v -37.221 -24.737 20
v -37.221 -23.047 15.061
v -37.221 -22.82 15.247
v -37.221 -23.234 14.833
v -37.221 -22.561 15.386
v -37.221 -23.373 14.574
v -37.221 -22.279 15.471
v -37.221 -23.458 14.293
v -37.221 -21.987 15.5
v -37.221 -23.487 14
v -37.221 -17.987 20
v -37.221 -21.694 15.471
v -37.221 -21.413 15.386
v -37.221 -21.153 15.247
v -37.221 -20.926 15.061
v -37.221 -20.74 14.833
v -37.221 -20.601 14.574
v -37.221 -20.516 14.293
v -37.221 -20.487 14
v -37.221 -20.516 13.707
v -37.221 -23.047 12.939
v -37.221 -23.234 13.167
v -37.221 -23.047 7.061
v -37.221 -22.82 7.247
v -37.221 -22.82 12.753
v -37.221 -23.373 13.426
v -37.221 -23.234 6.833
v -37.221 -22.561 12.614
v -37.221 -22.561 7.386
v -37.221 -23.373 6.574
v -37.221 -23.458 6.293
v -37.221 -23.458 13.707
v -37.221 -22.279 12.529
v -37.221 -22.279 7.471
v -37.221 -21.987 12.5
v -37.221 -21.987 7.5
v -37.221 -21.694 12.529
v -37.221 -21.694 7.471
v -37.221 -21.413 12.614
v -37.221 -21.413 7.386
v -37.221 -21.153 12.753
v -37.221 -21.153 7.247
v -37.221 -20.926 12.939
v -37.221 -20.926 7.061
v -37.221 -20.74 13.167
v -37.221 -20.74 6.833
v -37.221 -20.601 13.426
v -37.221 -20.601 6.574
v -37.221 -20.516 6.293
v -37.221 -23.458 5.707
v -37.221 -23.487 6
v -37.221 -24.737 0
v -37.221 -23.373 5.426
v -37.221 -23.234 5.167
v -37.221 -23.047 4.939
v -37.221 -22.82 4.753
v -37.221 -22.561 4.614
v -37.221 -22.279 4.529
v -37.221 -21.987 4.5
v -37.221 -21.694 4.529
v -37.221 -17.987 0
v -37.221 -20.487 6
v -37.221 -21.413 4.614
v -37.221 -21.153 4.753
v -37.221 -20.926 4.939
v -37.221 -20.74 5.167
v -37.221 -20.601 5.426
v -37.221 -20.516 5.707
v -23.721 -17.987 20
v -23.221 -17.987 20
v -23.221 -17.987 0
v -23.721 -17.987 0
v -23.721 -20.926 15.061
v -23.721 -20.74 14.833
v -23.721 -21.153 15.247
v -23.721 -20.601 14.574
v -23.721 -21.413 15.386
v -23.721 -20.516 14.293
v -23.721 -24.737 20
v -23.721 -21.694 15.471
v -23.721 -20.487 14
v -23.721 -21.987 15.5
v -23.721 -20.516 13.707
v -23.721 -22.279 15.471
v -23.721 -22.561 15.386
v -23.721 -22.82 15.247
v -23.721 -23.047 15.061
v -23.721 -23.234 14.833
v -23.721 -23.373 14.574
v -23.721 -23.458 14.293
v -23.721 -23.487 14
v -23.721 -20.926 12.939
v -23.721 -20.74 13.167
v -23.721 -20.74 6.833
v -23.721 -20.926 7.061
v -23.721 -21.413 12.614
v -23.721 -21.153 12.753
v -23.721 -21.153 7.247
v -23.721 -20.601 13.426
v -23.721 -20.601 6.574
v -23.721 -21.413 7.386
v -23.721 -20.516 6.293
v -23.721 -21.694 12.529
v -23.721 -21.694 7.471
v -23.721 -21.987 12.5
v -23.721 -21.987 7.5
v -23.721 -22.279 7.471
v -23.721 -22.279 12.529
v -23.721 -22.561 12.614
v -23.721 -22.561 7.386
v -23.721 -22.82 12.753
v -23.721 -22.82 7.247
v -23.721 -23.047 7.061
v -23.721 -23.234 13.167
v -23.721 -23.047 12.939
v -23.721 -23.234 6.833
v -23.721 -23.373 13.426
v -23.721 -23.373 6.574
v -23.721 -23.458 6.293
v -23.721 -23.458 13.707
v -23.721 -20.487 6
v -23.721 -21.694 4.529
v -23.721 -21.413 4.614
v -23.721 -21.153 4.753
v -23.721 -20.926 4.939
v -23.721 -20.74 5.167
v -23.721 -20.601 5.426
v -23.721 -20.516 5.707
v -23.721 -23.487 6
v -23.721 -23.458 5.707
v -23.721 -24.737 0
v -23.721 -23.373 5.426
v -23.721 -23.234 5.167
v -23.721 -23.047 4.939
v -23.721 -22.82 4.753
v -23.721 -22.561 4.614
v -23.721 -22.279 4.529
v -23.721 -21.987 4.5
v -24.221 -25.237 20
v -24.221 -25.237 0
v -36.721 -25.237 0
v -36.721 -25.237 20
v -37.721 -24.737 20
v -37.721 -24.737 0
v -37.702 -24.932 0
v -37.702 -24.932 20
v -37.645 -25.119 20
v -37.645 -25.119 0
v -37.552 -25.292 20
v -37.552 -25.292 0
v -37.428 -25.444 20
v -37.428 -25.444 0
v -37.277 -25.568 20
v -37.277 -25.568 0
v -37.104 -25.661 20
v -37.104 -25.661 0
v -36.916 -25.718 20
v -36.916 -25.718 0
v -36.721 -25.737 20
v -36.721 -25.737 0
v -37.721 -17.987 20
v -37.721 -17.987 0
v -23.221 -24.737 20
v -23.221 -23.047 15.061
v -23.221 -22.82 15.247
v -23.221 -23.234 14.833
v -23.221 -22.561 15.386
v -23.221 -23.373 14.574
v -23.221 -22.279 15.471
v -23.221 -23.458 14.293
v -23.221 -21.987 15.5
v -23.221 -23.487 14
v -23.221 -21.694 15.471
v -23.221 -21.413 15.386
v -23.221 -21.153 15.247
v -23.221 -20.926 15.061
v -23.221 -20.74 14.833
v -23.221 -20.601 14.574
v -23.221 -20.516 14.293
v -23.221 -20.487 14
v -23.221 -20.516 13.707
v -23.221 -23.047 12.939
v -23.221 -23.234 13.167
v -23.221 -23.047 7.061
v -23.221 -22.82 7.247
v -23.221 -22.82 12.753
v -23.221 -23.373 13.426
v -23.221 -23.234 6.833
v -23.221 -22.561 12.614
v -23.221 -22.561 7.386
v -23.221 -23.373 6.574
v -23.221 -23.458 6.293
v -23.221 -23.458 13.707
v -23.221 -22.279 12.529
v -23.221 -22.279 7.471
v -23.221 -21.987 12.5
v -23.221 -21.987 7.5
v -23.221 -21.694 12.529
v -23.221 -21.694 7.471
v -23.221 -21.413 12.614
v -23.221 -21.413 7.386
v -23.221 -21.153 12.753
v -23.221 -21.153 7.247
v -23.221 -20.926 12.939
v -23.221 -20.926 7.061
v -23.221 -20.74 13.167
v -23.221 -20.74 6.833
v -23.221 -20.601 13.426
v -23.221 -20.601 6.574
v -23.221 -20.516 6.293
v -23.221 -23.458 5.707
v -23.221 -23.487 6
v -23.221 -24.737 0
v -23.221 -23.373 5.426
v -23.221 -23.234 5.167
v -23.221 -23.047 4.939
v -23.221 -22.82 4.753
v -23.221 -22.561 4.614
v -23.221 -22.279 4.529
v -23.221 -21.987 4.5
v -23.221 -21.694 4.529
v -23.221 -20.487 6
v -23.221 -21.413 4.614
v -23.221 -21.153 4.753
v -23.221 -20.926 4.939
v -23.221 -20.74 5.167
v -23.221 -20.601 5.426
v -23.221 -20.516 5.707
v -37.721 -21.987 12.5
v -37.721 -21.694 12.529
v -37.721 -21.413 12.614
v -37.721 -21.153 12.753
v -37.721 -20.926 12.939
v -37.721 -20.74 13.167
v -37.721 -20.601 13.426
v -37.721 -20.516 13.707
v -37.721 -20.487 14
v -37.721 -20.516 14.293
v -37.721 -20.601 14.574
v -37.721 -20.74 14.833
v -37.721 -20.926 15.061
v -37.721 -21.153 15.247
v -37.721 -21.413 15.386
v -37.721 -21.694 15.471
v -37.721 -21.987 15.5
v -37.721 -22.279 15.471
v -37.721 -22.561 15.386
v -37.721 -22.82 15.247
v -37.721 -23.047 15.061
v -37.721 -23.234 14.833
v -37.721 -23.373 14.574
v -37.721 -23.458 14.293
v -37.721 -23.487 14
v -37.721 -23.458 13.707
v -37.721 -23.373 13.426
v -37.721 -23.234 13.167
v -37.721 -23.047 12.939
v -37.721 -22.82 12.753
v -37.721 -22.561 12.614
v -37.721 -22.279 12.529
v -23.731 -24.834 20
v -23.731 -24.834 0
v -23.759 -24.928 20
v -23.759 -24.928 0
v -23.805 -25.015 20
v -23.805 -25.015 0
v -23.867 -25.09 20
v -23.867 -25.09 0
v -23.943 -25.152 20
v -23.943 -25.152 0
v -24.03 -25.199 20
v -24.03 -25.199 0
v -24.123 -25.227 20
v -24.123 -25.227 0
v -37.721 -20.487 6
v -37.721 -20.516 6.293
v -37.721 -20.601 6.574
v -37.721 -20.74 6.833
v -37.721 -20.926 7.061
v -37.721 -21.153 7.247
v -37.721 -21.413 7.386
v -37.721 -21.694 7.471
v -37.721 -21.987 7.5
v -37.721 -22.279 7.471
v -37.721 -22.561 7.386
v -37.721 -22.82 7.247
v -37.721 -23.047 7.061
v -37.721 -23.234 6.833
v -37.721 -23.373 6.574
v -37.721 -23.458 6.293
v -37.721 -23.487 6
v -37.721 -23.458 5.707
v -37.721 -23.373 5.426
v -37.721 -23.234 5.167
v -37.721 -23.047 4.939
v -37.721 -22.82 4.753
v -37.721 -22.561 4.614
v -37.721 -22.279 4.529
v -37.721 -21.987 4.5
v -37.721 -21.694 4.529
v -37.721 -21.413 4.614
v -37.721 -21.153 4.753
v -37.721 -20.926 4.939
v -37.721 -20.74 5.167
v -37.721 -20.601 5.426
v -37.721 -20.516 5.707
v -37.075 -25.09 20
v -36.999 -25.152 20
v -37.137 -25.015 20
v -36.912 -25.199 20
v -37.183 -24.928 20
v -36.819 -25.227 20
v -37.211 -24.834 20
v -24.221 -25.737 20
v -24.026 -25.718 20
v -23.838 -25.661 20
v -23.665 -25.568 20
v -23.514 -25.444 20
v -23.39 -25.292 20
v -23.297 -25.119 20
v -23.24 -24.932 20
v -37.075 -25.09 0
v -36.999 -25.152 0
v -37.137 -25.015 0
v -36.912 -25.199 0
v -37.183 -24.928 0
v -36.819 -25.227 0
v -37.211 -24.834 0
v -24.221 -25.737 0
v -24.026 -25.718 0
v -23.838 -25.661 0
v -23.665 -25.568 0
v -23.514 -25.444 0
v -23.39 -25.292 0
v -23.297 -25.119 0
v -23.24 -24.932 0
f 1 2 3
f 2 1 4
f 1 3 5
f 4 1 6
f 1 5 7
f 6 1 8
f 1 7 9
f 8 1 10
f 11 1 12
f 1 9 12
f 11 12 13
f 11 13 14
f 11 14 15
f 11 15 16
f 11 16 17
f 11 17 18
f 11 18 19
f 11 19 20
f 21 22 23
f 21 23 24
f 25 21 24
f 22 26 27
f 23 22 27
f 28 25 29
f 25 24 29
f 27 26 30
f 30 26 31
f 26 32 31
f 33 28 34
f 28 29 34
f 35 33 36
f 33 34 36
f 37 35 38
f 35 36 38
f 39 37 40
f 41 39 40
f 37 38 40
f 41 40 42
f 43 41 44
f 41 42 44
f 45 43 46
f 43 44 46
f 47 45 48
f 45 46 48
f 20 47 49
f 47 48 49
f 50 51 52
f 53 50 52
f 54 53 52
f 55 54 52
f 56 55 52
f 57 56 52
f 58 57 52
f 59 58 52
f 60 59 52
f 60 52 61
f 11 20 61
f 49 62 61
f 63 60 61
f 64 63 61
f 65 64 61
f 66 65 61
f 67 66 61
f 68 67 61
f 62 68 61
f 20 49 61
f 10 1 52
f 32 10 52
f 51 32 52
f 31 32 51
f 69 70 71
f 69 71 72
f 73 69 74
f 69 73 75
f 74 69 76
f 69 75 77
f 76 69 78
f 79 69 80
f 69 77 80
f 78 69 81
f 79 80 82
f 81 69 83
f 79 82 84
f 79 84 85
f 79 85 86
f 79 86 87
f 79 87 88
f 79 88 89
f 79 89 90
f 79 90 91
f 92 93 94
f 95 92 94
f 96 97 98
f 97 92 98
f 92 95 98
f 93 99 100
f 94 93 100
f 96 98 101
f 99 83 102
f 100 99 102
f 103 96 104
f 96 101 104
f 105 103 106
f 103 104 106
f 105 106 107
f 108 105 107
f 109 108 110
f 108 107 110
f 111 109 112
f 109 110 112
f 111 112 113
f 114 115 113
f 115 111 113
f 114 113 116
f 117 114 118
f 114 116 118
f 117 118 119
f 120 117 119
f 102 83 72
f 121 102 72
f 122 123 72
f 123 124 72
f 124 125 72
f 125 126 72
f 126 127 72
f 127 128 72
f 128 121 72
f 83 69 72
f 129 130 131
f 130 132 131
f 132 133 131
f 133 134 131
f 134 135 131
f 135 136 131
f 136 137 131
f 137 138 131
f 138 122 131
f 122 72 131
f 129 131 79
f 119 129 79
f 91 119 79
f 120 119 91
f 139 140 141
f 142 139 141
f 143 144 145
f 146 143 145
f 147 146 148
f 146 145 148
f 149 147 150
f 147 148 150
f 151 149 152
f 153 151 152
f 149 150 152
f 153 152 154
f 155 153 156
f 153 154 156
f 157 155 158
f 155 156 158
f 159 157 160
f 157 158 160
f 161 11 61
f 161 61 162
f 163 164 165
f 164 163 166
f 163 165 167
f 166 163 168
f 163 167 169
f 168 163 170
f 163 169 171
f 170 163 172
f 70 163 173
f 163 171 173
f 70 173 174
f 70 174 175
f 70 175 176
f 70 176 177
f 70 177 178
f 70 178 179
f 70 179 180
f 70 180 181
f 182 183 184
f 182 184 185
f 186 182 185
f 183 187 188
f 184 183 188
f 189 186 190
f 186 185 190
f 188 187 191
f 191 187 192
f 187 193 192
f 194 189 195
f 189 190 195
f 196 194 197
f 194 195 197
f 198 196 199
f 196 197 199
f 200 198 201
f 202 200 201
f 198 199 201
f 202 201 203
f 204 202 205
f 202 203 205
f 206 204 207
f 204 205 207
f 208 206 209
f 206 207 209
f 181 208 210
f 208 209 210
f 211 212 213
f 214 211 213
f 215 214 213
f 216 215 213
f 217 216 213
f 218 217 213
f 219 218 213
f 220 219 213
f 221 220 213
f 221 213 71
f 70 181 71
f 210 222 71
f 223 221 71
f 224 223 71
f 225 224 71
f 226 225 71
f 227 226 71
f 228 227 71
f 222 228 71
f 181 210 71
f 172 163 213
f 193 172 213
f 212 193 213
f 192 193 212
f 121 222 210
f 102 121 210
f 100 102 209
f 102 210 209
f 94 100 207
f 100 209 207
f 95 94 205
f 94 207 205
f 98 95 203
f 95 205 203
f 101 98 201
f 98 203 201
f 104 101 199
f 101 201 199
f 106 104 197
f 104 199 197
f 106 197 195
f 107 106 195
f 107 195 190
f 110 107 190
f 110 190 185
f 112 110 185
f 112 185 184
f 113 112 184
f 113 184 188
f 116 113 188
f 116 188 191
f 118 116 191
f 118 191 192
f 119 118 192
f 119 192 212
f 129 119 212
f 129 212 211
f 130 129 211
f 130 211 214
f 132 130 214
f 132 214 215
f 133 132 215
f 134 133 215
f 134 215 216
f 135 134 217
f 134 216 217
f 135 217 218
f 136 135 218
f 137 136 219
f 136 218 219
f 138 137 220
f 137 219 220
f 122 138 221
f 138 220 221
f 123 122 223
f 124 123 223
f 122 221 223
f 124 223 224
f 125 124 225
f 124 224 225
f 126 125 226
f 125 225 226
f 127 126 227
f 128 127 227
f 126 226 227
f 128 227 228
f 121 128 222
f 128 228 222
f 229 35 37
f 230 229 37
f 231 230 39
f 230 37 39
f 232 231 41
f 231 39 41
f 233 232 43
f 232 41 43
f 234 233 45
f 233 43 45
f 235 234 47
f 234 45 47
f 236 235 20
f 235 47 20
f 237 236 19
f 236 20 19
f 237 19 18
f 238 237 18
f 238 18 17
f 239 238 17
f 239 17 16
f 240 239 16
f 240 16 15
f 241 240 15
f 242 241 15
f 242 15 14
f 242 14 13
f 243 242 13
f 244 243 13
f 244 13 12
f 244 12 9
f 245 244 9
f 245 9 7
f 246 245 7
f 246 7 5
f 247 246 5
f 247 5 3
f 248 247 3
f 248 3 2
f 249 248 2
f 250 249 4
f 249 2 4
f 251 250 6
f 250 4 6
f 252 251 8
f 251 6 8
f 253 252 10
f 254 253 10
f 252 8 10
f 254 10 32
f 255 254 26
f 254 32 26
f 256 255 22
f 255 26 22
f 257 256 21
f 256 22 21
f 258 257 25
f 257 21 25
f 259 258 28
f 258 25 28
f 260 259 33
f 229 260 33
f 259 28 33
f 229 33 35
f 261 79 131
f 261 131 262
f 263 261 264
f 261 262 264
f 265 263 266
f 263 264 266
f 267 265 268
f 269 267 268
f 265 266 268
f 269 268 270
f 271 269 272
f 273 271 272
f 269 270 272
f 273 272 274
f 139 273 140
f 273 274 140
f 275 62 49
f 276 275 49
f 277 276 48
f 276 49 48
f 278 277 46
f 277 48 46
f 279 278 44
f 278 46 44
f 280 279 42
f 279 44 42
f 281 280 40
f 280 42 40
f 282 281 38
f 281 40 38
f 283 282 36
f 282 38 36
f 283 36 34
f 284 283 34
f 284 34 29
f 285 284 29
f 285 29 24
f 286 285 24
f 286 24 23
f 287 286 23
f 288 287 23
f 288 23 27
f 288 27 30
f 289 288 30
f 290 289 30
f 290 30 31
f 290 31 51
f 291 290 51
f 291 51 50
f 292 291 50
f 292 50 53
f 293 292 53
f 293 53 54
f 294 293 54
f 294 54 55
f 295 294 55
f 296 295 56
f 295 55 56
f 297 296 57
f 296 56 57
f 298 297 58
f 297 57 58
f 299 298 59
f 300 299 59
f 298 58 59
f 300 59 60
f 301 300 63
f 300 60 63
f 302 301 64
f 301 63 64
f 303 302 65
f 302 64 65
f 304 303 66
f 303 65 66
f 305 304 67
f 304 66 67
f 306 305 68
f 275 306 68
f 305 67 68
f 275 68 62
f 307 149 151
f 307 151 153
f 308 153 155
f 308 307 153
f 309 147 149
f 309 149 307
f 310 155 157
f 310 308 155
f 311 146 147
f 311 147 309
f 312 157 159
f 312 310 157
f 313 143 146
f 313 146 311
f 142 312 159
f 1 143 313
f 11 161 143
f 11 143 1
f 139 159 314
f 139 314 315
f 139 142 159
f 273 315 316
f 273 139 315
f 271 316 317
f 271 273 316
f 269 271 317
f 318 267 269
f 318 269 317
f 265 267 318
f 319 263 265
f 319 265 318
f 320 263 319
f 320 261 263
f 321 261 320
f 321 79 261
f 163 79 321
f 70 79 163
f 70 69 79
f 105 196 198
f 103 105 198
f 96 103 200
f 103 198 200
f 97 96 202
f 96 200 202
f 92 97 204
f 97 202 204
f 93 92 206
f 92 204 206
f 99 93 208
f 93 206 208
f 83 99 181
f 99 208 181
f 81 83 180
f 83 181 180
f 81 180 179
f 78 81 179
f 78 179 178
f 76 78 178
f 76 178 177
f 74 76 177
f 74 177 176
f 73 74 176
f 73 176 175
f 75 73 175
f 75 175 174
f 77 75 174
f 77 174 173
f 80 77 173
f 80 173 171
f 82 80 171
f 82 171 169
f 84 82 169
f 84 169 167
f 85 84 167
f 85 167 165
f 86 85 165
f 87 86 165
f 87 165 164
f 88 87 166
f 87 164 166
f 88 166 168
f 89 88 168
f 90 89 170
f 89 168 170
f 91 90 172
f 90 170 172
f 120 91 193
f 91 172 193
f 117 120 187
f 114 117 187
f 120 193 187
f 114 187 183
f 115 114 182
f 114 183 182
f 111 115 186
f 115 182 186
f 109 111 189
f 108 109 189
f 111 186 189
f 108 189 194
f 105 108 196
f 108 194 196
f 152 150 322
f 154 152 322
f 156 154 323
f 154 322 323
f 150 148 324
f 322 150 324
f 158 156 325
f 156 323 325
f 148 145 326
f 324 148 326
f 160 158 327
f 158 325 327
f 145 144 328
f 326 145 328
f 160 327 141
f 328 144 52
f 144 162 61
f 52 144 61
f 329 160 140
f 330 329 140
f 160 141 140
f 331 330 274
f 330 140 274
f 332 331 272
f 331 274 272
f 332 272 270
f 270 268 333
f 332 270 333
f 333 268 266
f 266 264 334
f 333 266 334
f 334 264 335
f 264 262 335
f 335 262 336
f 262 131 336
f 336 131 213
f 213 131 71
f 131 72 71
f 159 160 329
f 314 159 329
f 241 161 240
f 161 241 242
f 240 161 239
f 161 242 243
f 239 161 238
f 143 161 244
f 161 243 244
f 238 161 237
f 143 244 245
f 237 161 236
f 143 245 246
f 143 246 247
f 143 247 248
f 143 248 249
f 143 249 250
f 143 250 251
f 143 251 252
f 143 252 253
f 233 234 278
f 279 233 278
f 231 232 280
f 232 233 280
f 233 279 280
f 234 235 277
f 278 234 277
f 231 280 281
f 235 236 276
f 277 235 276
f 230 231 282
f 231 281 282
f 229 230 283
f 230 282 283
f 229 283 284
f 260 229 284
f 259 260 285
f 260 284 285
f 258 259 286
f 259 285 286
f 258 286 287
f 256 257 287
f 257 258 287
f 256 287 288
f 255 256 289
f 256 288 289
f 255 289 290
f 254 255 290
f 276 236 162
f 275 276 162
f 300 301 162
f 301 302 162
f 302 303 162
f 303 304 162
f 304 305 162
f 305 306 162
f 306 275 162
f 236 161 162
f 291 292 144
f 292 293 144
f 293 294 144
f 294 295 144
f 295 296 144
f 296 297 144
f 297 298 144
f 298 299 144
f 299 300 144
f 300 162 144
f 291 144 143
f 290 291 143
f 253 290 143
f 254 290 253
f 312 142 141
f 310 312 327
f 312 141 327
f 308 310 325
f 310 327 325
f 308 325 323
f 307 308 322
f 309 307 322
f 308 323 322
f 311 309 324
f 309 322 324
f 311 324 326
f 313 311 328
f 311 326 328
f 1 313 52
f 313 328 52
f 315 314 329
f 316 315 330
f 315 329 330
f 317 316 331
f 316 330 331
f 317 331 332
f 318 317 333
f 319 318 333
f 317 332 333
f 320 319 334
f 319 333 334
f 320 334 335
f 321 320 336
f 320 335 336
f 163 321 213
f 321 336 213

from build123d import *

# Parameters (mm, degrees)
BRIDA_BASE1_DEPTH     = 20
CROQUIS5_R            = 1.5
CORTAR_EXTRUIR1_DEPTH = 36.673932989


# Sheet-metal steps are written as plain solids
with BuildPart() as part:
    # Croquis1 → Brida base1 (new body)
    with BuildSketch(Plane.XY):
        with BuildLine():
            Line((-37.721015228, -17.986734349), (-37.721015228, -24.736734349))
            ThreePointArc((-37.721015228, -24.736734349), (-37.42812201, -25.44384113), (-36.721015228, -25.736734349))
            Line((-36.721015228, -25.736734349), (-24.221015228, -25.736734349))
            ThreePointArc((-24.221015228, -25.736734349), (-23.513908447, -25.44384113), (-23.221015228, -24.736734349))
            Line((-23.221015228, -24.736734349), (-23.221015228, -17.986734349))
            Line((-23.221015228, -17.986734349), (-23.721015228, -17.986734349))
            Line((-23.721015228, -17.986734349), (-23.721015228, -24.736734349))
            ThreePointArc((-23.721015228, -24.736734349), (-23.867461838, -25.090287739), (-24.221015228, -25.236734349))
            Line((-24.221015228, -25.236734349), (-36.721015228, -25.236734349))
            ThreePointArc((-36.721015228, -25.236734349), (-37.074568619, -25.090287739), (-37.221015228, -24.736734349))
            Line((-37.221015228, -24.736734349), (-37.221015228, -17.986734349))
            Line((-37.221015228, -17.986734349), (-37.721015228, -17.986734349))
        make_face()
    extrude(amount=BRIDA_BASE1_DEPTH)

    # Croquis5 → Cortar-Extruir1 (cut, through all)
    with BuildSketch(Plane(origin=(-23.221015228, 0, 0), x_dir=(0, 0, -1), z_dir=(1, 0, 0))):
        with Locations((-14, -21.986734349)):
            Circle(CROQUIS5_R)
        with Locations(Location((-6, -21.986734349, 0), (0, 0, 90))):
            Circle(CROQUIS5_R)
    extrude(amount=-CORTAR_EXTRUIR1_DEPTH, mode=Mode.SUBTRACT)


solid = part.part
